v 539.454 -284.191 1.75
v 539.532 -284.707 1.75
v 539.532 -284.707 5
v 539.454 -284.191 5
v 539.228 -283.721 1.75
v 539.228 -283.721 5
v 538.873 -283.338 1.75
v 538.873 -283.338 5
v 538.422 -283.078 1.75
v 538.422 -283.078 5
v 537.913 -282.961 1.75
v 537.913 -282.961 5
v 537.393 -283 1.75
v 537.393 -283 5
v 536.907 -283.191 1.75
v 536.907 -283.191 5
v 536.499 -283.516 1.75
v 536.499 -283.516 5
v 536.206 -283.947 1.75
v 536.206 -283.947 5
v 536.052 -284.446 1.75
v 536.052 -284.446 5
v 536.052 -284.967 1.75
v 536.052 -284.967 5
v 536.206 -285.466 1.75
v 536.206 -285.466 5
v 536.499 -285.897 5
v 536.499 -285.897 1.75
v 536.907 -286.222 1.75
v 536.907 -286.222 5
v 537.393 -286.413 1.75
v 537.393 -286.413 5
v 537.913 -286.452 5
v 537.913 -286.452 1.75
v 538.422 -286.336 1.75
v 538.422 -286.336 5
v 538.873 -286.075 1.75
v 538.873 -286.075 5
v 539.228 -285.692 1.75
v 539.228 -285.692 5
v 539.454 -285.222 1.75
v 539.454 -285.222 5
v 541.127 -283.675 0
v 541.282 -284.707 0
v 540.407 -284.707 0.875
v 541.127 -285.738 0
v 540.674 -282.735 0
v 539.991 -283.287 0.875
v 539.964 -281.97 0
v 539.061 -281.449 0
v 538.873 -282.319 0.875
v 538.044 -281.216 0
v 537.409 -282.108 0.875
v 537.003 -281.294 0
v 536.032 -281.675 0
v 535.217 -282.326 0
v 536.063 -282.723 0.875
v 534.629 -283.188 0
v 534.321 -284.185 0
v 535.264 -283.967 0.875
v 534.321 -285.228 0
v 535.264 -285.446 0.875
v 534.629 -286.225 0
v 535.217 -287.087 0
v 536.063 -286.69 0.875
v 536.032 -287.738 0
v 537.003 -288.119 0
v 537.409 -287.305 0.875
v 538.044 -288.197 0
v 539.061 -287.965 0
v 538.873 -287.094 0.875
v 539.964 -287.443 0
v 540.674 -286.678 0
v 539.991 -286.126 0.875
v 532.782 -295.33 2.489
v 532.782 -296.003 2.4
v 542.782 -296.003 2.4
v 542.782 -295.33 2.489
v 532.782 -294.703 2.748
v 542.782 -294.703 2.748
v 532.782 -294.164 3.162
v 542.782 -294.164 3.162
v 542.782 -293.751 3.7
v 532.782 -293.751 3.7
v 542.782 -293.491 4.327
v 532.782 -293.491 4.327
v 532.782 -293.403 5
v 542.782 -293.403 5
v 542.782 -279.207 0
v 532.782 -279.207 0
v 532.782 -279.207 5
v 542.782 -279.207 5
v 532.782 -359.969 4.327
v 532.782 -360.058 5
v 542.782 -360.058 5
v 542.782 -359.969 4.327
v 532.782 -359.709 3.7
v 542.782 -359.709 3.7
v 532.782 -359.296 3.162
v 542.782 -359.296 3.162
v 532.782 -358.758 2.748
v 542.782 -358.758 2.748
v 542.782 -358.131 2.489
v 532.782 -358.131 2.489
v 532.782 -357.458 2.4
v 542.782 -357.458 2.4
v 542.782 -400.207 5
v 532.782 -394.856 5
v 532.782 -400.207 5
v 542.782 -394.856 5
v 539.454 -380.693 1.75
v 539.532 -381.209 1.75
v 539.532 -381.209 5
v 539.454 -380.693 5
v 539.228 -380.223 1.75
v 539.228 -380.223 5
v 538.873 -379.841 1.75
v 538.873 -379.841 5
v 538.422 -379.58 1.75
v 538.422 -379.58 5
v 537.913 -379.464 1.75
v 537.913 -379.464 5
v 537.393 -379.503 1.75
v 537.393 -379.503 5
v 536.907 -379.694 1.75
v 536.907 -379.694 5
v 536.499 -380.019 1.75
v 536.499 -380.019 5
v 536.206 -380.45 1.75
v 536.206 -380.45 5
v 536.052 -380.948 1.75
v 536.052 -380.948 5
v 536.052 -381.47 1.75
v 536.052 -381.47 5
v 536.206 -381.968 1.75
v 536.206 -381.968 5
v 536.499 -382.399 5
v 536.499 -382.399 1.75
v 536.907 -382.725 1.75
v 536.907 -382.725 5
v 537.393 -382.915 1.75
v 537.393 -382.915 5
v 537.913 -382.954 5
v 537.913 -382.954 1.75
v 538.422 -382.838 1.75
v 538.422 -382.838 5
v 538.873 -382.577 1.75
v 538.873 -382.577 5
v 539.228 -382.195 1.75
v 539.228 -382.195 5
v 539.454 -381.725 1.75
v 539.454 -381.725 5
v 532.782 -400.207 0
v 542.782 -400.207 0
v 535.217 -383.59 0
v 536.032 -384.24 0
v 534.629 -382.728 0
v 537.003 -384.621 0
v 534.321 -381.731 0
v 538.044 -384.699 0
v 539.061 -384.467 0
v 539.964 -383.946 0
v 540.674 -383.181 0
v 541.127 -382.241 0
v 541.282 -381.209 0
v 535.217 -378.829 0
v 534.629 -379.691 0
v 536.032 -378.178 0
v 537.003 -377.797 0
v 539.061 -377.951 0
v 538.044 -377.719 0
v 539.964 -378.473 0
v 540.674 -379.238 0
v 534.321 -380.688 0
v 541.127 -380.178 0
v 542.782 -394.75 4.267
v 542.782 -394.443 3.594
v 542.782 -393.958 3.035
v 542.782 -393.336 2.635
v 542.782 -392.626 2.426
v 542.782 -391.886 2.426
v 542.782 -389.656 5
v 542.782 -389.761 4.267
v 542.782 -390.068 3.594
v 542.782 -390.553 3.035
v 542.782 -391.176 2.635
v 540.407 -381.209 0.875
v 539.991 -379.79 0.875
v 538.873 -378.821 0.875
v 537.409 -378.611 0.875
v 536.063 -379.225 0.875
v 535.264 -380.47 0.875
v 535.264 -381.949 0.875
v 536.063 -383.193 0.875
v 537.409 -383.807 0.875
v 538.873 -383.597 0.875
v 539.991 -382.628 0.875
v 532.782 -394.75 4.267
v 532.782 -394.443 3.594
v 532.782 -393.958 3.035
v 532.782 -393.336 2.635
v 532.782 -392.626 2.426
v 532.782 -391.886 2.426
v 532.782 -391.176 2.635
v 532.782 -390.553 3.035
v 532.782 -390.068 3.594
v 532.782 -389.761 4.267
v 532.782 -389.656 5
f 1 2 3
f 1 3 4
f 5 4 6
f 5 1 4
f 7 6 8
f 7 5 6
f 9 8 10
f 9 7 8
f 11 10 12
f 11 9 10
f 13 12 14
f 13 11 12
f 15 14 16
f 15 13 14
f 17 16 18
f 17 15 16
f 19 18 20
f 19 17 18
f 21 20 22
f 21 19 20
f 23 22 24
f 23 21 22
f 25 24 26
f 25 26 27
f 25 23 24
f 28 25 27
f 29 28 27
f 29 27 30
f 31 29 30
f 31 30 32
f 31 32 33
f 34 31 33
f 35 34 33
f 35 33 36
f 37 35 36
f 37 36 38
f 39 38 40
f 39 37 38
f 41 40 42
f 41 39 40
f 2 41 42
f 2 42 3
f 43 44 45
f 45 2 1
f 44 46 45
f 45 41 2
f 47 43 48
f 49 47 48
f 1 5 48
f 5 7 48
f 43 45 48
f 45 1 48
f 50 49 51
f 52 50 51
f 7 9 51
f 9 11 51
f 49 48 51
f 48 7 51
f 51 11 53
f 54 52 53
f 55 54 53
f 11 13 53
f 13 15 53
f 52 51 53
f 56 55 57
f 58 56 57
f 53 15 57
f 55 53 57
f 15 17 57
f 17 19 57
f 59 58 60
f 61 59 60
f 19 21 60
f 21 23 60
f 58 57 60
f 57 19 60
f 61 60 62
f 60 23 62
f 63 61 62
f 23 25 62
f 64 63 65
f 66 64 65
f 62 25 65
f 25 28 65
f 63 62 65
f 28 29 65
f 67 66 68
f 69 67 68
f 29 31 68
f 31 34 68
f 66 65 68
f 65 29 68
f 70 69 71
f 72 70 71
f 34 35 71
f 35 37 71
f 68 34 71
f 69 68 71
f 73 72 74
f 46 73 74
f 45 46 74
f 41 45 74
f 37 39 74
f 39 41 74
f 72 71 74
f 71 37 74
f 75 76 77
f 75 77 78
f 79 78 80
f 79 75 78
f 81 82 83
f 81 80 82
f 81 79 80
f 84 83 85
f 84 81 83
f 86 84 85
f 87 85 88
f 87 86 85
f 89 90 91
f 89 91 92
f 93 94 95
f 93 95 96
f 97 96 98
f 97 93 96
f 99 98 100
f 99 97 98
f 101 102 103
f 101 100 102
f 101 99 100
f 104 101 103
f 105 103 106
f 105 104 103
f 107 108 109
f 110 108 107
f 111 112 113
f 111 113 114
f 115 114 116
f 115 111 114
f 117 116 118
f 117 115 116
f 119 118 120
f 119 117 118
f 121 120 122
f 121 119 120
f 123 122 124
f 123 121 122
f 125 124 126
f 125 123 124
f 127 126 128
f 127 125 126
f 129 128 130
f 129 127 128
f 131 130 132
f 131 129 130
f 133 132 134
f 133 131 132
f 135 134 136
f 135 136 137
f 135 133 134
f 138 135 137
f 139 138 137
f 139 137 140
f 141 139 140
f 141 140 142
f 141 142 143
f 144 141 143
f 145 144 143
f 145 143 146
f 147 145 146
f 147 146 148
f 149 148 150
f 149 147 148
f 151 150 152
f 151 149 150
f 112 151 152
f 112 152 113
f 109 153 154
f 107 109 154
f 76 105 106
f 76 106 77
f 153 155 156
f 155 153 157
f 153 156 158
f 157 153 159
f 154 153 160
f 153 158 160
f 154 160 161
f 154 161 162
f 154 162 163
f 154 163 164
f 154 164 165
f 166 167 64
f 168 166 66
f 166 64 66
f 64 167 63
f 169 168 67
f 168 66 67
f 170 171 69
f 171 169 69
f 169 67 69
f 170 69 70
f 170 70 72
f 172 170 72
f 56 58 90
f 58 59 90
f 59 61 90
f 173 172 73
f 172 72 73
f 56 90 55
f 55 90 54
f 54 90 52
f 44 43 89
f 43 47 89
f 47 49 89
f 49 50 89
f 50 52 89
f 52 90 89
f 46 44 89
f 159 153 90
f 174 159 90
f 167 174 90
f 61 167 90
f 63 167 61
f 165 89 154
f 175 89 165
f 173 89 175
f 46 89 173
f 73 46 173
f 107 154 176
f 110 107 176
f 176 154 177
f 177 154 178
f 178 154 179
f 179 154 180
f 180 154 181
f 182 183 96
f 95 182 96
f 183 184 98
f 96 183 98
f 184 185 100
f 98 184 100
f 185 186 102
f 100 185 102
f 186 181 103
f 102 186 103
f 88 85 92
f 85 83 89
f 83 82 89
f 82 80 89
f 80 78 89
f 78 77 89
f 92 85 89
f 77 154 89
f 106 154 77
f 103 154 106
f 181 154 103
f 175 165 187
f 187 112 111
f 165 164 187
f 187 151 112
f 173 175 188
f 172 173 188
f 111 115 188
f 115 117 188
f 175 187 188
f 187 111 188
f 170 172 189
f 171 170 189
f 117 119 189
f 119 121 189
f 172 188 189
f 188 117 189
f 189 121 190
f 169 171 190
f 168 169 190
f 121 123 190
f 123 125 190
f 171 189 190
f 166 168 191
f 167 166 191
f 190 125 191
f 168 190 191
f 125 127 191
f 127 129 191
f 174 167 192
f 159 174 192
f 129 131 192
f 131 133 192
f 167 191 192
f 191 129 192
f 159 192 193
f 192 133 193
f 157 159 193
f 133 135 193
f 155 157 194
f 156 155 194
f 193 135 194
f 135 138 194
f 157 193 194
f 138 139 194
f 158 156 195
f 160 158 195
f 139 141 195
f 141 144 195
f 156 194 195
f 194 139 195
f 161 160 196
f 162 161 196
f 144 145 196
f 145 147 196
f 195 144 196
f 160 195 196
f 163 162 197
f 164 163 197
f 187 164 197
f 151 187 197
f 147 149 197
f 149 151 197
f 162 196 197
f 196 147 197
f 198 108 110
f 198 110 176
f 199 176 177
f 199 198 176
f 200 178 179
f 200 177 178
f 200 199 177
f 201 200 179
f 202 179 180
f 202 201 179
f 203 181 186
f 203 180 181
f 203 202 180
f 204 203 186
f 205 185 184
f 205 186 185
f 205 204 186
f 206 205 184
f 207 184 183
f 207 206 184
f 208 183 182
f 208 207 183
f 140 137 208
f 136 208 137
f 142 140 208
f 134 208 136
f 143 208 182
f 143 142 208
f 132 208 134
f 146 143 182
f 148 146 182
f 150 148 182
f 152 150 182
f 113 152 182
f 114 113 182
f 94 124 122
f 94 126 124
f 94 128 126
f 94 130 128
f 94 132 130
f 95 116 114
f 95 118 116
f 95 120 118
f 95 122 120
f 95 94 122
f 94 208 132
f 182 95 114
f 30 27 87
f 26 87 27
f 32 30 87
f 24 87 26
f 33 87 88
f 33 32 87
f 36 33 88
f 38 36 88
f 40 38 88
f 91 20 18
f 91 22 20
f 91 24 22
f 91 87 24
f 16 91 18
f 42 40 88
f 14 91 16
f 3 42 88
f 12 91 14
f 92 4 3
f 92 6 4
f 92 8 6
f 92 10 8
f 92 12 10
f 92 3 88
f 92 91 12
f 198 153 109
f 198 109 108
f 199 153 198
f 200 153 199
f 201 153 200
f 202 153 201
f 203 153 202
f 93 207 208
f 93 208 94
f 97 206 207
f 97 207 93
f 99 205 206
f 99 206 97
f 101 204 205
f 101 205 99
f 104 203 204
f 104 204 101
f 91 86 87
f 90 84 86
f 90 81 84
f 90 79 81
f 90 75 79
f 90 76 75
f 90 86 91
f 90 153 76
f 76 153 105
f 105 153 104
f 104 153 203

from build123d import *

# Parameters (mm, degrees)
SKETCH055_W          = 10
SKETCH055_H          = 121
SKETCH055_R          = 1.75
PAD026_DEPTH         = 5
SKETCH056_R          = 2.6
POCKET026_DEPTH      = 0.001
POCKET026_DEPTH_BACK = 542.783232
CHAMFER002_SIZE      = 1.75


with BuildPart() as part:
    # Sketch055 → Pad026 (new body)
    with BuildSketch(Plane.XY):
        with Locations((537.782232, -339.706519)):
            Rectangle(SKETCH055_W, SKETCH055_H)
        with Locations((537.782232, -381.20917)):
            Circle(SKETCH055_R, mode=Mode.SUBTRACT)
        with Locations((537.782232, -284.706588)):
            Circle(SKETCH055_R, mode=Mode.SUBTRACT)
    extrude(amount=PAD026_DEPTH)

    # Sketch056 → Pocket026 (cut, two sides)
    with BuildSketch(Plane.YZ) as pocket026_sk:
        with Locations((-392.25561, 5)):
            Circle(SKETCH056_R)
        with BuildLine():
            ThreePointArc((-357.457814, 7.6), (-360.057814, 5), (-357.457814, 2.4))
            Line((-357.457814, 2.4), (-296.002518, 2.4))
            ThreePointArc((-296.002518, 2.4), (-293.402518, 5), (-296.002518, 7.6))
            Line((-357.457814, 7.6), (-296.002518, 7.6))
        make_face()
    extrude(amount=-POCKET026_DEPTH, mode=Mode.SUBTRACT)
    extrude(pocket026_sk.sketch, amount=POCKET026_DEPTH_BACK, mode=Mode.SUBTRACT)

    # Chamfer002
    chamfer002_edges = [part.edges().sort_by_distance(p)[0] for p in [
        (536.032232, -381.20917, 0),
        (536.032232, -284.706588, 0),
    ]]
    chamfer(chamfer002_edges, length=CHAMFER002_SIZE)


solid = part.part
